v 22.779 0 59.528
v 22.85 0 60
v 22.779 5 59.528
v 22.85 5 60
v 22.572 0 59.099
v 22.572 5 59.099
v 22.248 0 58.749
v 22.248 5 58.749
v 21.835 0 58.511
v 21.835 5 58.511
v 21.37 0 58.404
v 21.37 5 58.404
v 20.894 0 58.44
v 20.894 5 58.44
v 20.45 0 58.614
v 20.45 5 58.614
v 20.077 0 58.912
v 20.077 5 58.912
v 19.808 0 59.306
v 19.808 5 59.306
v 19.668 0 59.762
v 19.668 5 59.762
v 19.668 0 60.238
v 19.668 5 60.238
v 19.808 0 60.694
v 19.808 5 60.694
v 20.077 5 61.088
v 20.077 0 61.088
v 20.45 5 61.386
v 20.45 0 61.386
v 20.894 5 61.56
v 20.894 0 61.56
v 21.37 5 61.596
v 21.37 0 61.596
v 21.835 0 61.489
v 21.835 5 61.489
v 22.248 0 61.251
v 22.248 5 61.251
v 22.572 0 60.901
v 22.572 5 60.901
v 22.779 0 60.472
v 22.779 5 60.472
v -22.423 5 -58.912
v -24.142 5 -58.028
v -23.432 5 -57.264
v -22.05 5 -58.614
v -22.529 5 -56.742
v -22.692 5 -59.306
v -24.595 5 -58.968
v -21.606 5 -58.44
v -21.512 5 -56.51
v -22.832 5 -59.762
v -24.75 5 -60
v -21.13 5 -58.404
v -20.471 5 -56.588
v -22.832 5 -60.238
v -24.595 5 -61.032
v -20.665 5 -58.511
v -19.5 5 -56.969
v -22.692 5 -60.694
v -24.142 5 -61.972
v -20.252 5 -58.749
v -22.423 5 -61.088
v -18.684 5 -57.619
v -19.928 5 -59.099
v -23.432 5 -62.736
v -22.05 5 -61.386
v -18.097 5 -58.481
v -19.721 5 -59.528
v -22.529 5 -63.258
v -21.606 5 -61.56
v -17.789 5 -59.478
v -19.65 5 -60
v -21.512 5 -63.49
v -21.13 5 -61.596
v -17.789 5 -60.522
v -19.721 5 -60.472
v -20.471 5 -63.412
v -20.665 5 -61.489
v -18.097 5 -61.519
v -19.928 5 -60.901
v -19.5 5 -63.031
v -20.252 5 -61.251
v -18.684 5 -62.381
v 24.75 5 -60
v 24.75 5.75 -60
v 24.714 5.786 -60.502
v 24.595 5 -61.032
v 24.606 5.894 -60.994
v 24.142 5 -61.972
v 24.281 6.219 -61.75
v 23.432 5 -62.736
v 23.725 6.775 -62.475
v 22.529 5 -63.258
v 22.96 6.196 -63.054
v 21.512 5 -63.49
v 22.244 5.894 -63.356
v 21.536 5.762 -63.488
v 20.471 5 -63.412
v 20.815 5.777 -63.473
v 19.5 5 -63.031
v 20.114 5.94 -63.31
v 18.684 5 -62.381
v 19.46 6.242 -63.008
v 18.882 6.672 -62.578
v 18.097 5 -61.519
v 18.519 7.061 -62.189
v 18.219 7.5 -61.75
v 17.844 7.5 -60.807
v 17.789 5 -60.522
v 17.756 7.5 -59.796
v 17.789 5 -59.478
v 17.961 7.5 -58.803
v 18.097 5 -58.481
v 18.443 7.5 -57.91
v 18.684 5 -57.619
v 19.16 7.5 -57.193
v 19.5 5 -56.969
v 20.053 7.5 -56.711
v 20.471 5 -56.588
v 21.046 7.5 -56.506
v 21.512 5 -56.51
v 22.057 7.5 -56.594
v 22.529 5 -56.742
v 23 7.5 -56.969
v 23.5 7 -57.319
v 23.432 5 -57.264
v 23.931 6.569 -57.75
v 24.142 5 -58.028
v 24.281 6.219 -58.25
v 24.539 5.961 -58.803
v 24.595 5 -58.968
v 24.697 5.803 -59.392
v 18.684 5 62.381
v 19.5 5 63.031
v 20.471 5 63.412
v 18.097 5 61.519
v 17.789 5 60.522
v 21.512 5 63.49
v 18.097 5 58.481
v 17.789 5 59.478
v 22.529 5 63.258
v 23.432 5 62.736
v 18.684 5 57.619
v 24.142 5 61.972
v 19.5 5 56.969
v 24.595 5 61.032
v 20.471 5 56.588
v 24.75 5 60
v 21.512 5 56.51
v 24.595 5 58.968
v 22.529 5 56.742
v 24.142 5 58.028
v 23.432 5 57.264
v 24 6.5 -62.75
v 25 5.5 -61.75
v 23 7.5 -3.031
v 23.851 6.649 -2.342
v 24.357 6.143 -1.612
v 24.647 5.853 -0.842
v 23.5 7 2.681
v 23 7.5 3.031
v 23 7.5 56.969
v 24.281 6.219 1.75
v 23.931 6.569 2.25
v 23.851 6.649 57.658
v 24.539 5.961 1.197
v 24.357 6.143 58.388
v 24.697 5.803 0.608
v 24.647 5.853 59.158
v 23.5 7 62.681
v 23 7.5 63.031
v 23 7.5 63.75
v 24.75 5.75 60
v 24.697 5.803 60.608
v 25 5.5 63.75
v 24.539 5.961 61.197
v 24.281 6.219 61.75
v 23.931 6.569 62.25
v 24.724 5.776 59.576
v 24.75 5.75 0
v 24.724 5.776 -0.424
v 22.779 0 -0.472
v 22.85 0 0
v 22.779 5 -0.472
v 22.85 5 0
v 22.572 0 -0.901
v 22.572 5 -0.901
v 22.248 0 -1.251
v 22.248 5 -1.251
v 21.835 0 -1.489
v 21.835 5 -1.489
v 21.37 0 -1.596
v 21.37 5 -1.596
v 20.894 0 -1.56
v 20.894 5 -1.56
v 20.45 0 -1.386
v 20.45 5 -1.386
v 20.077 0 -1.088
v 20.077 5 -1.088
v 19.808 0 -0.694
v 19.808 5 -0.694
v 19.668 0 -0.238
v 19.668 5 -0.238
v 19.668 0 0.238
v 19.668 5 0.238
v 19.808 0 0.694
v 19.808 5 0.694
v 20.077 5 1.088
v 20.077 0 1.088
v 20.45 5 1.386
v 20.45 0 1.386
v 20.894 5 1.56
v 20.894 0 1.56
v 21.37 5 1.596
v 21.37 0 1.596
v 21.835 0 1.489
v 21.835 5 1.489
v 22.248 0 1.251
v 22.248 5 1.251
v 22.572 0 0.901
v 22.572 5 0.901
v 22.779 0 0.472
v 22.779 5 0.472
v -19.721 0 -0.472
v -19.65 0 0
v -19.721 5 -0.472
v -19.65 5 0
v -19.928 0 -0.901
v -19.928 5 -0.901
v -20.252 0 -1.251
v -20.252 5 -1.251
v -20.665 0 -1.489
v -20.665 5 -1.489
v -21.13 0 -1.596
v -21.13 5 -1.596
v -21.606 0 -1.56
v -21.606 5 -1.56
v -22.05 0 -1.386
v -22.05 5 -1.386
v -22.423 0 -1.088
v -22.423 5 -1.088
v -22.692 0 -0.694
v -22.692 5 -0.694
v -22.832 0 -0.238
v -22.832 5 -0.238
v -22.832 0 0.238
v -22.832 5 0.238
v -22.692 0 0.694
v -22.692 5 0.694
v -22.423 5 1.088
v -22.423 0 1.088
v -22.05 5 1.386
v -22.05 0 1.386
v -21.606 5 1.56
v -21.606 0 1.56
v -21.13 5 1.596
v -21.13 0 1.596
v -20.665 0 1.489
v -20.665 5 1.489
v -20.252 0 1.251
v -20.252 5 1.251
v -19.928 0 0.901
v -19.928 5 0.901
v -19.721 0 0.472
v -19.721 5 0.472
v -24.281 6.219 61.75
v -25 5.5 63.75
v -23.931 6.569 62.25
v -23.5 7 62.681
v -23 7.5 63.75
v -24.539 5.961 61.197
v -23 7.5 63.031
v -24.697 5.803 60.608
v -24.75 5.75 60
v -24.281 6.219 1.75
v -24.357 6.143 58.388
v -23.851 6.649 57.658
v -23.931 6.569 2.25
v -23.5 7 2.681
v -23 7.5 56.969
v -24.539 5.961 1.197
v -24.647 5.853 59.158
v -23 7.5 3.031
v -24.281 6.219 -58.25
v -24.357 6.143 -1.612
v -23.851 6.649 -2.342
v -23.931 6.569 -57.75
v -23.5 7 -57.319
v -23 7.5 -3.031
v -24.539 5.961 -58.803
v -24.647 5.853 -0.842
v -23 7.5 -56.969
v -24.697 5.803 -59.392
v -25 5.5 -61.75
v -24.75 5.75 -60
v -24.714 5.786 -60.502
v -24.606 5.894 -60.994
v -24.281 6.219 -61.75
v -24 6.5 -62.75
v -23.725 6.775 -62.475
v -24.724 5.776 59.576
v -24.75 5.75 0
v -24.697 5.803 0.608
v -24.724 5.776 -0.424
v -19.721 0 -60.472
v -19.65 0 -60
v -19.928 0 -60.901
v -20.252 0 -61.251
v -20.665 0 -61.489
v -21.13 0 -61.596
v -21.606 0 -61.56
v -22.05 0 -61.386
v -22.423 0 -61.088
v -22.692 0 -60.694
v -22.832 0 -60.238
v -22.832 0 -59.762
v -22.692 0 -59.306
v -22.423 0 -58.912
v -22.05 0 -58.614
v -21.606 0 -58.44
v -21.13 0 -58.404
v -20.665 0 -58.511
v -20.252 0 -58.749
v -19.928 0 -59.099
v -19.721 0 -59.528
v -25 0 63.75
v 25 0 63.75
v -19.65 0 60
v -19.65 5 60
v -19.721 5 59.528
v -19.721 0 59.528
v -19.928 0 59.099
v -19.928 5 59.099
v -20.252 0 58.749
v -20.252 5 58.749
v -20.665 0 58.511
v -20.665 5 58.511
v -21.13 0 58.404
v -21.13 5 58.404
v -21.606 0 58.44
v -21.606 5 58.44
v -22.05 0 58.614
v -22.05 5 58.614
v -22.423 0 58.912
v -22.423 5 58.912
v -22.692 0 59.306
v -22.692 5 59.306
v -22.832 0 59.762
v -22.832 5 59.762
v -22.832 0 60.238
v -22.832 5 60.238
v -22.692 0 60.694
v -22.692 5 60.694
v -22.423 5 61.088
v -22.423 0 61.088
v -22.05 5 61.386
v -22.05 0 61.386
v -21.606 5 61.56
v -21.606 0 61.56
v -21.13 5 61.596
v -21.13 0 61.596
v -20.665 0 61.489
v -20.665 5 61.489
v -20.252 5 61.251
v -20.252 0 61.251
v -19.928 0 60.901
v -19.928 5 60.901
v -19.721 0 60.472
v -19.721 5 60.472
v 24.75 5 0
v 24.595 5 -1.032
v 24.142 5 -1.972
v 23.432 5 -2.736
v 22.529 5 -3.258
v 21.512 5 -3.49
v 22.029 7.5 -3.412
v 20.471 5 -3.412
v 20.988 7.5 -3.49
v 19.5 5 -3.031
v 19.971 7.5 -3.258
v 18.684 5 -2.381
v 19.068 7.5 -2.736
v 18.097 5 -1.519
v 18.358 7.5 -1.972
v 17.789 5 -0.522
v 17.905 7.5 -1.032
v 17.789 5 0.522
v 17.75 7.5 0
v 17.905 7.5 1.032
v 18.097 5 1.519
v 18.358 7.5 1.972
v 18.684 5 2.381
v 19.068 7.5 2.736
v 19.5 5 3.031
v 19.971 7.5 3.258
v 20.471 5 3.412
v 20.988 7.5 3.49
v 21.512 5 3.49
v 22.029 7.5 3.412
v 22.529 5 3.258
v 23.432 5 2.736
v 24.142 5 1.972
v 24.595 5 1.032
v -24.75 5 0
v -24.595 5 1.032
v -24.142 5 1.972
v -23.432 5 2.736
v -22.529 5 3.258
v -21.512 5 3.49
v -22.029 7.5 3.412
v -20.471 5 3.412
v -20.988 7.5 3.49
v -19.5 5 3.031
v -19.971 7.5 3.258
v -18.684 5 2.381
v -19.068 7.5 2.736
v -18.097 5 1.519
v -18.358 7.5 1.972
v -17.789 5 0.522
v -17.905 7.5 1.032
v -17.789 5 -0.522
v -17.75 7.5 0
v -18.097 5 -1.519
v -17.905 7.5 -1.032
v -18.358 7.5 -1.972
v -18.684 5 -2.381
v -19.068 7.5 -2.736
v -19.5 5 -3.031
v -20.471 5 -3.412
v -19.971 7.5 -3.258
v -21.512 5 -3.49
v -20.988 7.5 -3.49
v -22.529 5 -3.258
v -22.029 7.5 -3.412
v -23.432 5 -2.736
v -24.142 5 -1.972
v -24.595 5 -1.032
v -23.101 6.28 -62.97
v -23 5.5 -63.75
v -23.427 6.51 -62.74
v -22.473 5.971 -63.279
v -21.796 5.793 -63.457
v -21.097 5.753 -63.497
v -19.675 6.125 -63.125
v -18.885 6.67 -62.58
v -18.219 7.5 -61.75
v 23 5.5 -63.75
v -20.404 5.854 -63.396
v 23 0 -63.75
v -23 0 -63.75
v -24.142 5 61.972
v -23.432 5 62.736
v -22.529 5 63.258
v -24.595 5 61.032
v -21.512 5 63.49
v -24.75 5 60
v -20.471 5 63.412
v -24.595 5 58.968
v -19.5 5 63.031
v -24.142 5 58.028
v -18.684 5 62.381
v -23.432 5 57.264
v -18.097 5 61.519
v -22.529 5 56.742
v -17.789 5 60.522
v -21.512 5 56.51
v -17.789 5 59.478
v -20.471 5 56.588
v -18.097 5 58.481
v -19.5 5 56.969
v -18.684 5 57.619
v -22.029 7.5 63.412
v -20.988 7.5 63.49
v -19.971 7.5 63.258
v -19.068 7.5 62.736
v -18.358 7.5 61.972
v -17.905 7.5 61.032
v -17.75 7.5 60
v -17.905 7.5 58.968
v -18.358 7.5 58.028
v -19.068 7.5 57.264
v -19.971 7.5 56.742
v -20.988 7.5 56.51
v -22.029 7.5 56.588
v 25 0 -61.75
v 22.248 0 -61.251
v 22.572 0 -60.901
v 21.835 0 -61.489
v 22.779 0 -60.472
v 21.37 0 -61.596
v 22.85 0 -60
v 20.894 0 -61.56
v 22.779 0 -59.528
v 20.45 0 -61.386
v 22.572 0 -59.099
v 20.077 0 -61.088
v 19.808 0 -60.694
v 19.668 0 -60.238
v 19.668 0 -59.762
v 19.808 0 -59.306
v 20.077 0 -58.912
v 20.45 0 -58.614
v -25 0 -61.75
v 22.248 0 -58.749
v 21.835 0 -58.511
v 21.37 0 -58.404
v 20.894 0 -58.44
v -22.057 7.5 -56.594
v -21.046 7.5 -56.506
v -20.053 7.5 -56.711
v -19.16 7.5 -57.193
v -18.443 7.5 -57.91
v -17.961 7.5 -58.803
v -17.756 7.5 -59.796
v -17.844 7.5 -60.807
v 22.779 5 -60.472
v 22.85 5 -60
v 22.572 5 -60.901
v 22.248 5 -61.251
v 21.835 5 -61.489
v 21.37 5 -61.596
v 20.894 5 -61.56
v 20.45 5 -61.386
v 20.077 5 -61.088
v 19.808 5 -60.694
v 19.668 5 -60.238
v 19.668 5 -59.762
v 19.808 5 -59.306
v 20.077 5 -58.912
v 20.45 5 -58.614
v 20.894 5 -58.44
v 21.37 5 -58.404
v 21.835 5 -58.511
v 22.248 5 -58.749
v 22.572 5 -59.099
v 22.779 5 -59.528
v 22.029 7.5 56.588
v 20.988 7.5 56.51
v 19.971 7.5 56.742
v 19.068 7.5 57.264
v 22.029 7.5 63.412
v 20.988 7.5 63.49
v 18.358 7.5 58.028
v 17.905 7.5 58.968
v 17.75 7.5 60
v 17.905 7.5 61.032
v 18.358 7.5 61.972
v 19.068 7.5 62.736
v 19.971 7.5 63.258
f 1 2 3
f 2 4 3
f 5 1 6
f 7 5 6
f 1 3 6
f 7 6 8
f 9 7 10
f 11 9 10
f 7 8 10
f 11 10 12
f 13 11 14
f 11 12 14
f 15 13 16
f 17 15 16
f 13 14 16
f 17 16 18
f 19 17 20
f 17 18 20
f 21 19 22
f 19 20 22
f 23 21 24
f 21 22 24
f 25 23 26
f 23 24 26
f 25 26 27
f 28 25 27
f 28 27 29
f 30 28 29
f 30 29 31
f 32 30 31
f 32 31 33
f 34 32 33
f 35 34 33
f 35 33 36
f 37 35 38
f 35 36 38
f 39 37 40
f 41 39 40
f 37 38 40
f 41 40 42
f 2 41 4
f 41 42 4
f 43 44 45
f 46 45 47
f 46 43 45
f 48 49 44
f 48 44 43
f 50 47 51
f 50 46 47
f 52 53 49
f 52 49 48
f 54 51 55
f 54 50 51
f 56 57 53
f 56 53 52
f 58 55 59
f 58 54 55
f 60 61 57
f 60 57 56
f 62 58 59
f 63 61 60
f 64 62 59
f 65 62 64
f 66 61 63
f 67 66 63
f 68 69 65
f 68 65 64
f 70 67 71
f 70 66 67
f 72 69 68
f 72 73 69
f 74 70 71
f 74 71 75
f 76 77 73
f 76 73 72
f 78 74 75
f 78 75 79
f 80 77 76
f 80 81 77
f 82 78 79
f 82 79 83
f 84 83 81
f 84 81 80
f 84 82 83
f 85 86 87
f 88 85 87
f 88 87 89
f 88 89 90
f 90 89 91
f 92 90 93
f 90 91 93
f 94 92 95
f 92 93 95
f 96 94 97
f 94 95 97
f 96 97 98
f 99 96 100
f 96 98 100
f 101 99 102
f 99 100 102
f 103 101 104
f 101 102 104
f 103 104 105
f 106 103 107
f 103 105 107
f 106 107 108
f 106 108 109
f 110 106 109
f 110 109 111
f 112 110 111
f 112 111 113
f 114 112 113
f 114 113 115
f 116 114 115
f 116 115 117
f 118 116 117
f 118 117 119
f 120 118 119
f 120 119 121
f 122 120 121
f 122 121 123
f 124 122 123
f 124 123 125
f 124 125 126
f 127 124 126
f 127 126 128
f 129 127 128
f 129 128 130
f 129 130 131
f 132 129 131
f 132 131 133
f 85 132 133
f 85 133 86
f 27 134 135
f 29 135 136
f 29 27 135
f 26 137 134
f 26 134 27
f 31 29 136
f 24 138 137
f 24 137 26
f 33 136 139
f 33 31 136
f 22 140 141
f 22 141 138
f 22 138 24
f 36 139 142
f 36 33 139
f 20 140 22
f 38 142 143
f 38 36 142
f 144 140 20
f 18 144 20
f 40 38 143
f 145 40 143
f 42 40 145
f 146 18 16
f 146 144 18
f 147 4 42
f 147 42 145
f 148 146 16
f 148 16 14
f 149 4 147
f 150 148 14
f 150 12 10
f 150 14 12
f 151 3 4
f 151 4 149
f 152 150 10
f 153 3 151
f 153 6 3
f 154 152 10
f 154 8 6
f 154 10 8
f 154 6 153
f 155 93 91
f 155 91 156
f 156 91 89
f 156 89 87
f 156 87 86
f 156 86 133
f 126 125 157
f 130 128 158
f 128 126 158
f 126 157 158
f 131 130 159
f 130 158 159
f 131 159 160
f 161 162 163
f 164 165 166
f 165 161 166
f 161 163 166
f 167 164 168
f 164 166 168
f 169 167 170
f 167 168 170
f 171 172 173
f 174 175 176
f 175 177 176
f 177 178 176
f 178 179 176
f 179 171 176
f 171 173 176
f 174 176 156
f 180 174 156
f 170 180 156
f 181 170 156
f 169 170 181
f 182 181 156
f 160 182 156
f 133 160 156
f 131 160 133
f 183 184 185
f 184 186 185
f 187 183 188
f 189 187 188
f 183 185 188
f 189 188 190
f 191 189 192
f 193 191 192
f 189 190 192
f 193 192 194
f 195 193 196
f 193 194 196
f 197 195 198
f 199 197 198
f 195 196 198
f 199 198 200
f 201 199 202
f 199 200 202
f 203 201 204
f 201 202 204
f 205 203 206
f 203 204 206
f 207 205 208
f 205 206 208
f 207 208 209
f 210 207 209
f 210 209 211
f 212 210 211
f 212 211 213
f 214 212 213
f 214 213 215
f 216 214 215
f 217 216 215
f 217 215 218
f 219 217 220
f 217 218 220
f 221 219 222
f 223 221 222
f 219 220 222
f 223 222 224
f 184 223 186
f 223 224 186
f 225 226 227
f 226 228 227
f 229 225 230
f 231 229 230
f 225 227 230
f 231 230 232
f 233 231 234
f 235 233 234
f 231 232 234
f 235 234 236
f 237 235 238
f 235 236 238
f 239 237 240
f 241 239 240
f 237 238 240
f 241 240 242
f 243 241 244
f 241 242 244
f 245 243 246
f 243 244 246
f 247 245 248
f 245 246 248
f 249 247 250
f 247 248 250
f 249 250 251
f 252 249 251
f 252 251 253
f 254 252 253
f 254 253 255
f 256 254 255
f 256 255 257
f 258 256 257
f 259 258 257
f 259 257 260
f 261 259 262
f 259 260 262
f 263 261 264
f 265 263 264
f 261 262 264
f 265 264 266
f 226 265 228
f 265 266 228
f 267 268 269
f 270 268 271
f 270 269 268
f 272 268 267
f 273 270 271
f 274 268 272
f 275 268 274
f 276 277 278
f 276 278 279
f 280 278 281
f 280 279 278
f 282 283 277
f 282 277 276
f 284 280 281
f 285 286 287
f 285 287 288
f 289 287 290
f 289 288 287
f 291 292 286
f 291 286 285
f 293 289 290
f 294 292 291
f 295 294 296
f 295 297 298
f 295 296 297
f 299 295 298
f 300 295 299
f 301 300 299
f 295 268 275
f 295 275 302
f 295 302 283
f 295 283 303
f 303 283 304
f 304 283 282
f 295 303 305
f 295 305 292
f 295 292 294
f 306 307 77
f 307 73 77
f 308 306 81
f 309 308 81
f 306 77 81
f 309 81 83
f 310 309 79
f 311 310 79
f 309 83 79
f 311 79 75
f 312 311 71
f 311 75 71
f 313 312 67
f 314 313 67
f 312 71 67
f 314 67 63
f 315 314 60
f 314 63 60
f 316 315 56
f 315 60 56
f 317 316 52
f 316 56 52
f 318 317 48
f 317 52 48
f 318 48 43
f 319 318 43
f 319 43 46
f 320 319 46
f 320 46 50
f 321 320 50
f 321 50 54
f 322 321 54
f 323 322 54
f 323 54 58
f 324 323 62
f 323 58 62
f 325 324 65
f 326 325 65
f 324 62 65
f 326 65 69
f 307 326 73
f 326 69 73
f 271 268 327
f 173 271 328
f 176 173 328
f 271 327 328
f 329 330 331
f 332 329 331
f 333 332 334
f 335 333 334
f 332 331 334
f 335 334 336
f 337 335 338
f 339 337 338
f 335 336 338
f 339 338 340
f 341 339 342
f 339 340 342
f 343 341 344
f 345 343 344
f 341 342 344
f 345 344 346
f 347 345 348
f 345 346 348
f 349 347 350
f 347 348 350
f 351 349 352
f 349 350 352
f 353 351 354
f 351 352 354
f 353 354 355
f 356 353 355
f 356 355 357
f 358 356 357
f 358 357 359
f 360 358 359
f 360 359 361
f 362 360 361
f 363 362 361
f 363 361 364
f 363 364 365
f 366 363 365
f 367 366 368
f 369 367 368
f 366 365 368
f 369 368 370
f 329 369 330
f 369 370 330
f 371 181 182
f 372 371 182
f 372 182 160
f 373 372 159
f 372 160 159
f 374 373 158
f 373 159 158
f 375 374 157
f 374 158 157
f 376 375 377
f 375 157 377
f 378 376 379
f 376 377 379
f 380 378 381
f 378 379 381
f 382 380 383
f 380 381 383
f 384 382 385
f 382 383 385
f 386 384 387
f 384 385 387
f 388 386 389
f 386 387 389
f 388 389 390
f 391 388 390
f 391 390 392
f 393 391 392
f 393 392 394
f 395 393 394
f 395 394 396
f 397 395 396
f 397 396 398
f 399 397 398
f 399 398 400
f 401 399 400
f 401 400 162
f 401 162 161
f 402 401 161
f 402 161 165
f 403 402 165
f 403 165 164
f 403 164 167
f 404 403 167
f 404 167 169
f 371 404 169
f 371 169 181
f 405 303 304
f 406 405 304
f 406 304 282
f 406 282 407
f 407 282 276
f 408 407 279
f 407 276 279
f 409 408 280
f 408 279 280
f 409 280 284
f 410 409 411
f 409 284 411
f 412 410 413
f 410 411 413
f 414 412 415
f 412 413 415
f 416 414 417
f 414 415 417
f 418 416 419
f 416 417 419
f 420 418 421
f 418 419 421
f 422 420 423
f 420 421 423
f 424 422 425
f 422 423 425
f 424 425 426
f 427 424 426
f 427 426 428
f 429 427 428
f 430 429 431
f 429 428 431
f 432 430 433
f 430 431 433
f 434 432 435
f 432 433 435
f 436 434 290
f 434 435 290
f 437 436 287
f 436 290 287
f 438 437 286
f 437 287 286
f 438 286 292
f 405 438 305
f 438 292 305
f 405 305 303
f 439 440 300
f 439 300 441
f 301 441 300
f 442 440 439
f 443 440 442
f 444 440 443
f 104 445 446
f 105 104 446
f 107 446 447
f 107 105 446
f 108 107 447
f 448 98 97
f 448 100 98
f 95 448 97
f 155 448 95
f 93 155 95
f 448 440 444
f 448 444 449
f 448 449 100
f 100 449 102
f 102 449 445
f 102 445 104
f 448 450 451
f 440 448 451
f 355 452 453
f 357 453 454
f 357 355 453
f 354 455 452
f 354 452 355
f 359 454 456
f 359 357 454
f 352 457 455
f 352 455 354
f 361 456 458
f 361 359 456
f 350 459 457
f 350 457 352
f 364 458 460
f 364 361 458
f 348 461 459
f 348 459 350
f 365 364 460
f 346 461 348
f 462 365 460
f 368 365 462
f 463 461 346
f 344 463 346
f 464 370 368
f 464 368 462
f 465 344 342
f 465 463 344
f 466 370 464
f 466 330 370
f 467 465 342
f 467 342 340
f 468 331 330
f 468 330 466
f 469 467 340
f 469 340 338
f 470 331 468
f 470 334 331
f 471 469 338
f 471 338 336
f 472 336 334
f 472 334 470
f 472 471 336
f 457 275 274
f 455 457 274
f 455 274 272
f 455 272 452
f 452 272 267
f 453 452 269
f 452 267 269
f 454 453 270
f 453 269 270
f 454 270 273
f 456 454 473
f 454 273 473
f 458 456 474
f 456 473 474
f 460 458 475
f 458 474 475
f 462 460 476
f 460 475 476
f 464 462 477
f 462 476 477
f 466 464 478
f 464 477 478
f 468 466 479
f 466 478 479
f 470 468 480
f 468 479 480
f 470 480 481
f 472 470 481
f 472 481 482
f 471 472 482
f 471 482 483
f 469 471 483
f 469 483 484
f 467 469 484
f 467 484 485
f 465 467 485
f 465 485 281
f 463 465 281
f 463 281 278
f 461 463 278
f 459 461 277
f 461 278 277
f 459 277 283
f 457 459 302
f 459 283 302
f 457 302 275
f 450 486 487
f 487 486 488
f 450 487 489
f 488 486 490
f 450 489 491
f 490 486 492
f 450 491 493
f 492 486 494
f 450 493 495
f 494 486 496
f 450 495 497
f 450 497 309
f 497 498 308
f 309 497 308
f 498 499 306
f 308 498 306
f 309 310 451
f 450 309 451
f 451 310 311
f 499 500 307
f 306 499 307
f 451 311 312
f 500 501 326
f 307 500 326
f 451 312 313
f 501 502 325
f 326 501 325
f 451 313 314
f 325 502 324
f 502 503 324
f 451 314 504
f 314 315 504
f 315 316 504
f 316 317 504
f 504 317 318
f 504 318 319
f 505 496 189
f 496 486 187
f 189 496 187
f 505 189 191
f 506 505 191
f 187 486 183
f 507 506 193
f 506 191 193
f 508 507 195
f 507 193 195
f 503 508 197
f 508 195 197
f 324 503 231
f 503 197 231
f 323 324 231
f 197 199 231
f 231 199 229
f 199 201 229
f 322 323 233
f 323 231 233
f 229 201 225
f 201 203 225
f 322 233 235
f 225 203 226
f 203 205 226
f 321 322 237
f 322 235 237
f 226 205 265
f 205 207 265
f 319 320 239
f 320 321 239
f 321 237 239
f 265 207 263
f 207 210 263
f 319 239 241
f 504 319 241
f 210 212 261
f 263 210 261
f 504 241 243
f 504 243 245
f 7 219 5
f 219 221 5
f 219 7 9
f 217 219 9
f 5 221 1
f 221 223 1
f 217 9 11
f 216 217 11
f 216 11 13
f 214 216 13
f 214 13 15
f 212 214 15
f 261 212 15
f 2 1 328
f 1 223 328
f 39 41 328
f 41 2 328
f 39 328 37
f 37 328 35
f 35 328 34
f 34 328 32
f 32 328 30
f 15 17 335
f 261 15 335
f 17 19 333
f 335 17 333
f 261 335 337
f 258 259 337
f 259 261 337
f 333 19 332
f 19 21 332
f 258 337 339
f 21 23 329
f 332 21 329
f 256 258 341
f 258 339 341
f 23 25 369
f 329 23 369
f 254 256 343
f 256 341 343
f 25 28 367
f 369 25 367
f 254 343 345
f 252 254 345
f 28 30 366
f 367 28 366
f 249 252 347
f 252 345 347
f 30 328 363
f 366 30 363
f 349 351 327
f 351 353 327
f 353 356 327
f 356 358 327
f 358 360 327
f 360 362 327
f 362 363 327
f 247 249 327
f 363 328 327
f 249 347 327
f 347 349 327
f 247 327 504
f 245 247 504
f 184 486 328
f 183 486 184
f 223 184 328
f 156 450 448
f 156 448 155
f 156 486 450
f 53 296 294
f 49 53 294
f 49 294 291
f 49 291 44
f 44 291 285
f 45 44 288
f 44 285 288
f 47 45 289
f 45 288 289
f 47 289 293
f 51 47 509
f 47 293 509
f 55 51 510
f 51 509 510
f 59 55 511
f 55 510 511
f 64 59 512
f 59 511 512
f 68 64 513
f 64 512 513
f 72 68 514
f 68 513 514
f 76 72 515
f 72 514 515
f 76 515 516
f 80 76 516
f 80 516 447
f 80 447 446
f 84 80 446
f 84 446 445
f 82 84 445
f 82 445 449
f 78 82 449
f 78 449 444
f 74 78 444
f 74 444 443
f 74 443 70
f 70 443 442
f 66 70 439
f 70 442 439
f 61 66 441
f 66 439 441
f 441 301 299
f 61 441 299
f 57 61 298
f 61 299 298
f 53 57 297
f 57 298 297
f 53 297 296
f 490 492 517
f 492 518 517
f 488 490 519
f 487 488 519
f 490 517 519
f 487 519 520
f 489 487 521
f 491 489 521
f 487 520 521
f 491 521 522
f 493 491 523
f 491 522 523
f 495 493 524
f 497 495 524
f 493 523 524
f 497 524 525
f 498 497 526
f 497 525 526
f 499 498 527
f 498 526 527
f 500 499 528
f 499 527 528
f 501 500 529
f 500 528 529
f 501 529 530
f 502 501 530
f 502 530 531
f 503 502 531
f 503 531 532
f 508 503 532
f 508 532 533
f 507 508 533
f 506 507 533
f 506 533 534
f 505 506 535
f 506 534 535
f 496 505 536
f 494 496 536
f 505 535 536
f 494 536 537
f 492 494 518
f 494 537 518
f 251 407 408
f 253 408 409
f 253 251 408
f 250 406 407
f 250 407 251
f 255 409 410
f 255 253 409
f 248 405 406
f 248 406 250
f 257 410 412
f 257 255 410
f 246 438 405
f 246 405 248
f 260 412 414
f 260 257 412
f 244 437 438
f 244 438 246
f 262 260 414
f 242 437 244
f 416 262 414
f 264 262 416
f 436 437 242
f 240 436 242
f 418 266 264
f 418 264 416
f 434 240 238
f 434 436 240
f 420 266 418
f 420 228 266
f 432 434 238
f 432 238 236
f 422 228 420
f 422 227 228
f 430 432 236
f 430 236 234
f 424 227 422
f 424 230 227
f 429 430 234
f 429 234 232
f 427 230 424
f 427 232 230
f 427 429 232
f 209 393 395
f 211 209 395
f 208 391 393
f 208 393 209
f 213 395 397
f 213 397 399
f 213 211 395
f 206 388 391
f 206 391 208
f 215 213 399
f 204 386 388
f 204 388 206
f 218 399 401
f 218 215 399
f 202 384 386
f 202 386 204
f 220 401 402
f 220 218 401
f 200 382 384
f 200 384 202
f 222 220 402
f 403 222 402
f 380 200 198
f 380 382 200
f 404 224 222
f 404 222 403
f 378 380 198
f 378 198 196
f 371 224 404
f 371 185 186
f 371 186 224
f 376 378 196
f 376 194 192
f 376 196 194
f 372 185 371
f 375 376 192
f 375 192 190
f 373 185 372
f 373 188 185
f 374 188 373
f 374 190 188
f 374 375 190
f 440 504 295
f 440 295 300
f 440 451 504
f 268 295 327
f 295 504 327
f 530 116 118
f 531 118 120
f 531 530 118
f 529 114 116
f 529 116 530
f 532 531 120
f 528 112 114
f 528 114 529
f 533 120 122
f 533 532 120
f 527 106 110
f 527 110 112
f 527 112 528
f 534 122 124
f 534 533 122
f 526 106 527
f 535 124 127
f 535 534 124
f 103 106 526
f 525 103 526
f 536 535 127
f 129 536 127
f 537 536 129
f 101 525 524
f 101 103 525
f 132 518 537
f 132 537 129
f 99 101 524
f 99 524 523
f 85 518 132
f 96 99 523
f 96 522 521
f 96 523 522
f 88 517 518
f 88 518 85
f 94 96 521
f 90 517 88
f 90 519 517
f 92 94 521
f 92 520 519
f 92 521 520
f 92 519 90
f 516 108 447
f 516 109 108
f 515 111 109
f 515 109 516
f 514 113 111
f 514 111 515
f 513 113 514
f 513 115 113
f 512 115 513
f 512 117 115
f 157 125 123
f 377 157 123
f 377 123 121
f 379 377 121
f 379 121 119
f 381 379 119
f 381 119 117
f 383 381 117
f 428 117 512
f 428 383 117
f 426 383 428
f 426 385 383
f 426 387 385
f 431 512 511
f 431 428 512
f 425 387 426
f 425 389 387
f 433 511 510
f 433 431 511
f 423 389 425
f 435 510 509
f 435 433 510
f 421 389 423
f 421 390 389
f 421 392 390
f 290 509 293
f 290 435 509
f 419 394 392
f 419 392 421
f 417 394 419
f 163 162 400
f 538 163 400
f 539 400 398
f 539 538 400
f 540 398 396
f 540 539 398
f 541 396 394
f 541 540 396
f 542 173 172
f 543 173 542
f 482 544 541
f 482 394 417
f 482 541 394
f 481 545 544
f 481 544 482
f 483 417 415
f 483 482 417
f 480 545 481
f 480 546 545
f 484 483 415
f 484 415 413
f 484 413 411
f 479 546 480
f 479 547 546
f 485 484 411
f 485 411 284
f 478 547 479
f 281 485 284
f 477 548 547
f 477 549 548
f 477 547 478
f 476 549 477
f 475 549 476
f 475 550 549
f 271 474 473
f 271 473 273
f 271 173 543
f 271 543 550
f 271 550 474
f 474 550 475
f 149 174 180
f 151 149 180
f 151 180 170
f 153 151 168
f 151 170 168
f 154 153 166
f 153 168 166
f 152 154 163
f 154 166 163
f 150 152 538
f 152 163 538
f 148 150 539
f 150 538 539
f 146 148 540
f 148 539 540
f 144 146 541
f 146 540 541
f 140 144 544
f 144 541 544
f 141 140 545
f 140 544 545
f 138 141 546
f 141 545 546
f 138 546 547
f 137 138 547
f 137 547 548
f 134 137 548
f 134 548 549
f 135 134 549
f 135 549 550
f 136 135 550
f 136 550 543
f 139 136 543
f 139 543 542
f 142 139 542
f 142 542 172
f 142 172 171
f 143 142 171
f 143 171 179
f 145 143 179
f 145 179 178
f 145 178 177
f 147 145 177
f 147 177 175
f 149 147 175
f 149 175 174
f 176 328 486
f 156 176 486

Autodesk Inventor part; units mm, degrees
ref_plane "YZ Plane" through (0, 0, 0) normal (1, 0, 0) x (0, 1, 0)
ref_plane "XZ Plane" through (0, 0, 0) normal (0, 1, 0) x (-1, 0, 0)
ref_plane "XY Plane" through (0, 0, 0) normal (0, 0, 1) x (1, 0, 0)
sketch "Sketch1" plane through (0, 0, 0) normal (0, 1, 0) x (-1, 0, 0)
  line L0 (25, 63.75) -> (-25, 63.75)
  line L1 (-25, 63.75) -> (-25, -63.75)
  line L2 (-25, -63.75) -> (25, -63.75)
  line L3 (25, -63.75) -> (25, 63.75)
  point P0 (0, 0)
  dimension "d0" = 50
  dimension "d1" = 127.5
  dimension "d2" = 25
  dimension "d3" = 63.75
extrude "Extrusion1" add sketch "Sketch1" along normal blind 7.5
sketch "Sketch2" plane through (0, 7.5, 0) normal (0, 1, 0) x (1, 0, 0)
  circle A0 centre (-21.25, -60) radius 1.6
  circle A1 centre (-21.25, 60) radius 1.6
  circle A2 centre (21.25, -60) radius 1.6
  circle A3 centre (21.25, 60) radius 1.6
  circle A4 centre (-21.25, 0) radius 1.6
  circle A5 centre (21.25, 0) radius 1.6
  line L0 (25, -63.75) -> (25, 63.75) projected
  line L1 (25, 63.75) -> (-25, 63.75) projected
  line L2 (-25, -63.75) -> (25, -63.75) projected
  line L3 (-25, 63.75) -> (-25, -63.75) projected
  point P0 (0, 0)
  dimension "d6" = 3.2
  dimension "d7" = 3.2
  dimension "d8" = 3.2
  dimension "d9" = 3.2
  dimension "d10" = 3.2
  dimension "d11" = 3.2
  dimension "d12" = 3.75
  dimension "d13" = 3.75
  dimension "d14" = 3.75
  dimension "d15" = 3.75
  dimension "d16" = 3.75
  dimension "d17" = 3.75
  dimension "d18" = 3.75
  dimension "d19" = 3.75
  dimension "d20" = 3.75
  dimension "d21" = 3.75
  dimension "d22" = 63.75
  dimension "d23" = 63.75
extrude "Extrusion2" cut sketch "Sketch2" against normal through all contours A0 | A1 | A2 | A3 | A4 | A5
sketch "Sketch3" plane through (0, 7.5, 0) normal (0, 1, 0) x (1, 0, 0)
  circle A0 centre (21.25, -60) radius 1.6 projected
  circle A1 centre (21.25, -60) radius 3.5
  circle A2 centre (21.25, 0) radius 1.6 projected
  circle A3 centre (21.25, 0) radius 3.5
  circle A4 centre (21.25, 60) radius 3.5
  line L0 (25, 63.75) -> (-25, 63.75) projected
  line L1 (25, -63.75) -> (25, 63.75) projected
  point P0 (0, 0)
  dimension "d26" = 7
  dimension "d27" = 7
  dimension "d28" = 7
  dimension "d29" = 3.75
  dimension "d30" = 3.75
extrude "Extrusion3" cut sketch "Sketch3" against normal blind 2.5
mirror "Mirror1" about plane through (0, 0, 0) normal (1, 0, 0) of "Extrusion3"
chamfer "Chamfer1" distance 2 angle 45 3 edges at (25, 7.5, 0) (0, 7.5, -63.75) (-25, 7.5, 0)
chamfer "Chamfer2" distance 2 angle 45 2 edges at (-25, 2.75, -63.75) (25, 2.75, -63.75)
equation "\"d2\" = 0.5 * d0"
equation "\"d3\" = 0.5 * d1"
equation "\"d12\" = 0.5 * Thickness"
equation "\"d13\" = 0.5 * Thickness"
equation "\"d14\" = 0.5 * Thickness"
equation "\"d15\" = 0.5 * Thickness"
equation "\"d16\" = 0.5 * Thickness"
equation "\"d17\" = 0.5 * Thickness"
equation "\"d18\" = 0.5 * Thickness"
equation "\"d19\" = 0.5 * Thickness"
equation "\"d20\" = 0.5 * Thickness"
equation "\"d21\" = 0.5 * Thickness"
equation "\"d22\" = 0.5 * d1"
equation "\"d23\" = 0.5 * d1"
equation "\"d29\" = 0.5 * Thickness"
equation "\"d30\" = 0.5 * Thickness"
equation "\"Thickness\" = 7.5"
properties part number "Top Covers"
